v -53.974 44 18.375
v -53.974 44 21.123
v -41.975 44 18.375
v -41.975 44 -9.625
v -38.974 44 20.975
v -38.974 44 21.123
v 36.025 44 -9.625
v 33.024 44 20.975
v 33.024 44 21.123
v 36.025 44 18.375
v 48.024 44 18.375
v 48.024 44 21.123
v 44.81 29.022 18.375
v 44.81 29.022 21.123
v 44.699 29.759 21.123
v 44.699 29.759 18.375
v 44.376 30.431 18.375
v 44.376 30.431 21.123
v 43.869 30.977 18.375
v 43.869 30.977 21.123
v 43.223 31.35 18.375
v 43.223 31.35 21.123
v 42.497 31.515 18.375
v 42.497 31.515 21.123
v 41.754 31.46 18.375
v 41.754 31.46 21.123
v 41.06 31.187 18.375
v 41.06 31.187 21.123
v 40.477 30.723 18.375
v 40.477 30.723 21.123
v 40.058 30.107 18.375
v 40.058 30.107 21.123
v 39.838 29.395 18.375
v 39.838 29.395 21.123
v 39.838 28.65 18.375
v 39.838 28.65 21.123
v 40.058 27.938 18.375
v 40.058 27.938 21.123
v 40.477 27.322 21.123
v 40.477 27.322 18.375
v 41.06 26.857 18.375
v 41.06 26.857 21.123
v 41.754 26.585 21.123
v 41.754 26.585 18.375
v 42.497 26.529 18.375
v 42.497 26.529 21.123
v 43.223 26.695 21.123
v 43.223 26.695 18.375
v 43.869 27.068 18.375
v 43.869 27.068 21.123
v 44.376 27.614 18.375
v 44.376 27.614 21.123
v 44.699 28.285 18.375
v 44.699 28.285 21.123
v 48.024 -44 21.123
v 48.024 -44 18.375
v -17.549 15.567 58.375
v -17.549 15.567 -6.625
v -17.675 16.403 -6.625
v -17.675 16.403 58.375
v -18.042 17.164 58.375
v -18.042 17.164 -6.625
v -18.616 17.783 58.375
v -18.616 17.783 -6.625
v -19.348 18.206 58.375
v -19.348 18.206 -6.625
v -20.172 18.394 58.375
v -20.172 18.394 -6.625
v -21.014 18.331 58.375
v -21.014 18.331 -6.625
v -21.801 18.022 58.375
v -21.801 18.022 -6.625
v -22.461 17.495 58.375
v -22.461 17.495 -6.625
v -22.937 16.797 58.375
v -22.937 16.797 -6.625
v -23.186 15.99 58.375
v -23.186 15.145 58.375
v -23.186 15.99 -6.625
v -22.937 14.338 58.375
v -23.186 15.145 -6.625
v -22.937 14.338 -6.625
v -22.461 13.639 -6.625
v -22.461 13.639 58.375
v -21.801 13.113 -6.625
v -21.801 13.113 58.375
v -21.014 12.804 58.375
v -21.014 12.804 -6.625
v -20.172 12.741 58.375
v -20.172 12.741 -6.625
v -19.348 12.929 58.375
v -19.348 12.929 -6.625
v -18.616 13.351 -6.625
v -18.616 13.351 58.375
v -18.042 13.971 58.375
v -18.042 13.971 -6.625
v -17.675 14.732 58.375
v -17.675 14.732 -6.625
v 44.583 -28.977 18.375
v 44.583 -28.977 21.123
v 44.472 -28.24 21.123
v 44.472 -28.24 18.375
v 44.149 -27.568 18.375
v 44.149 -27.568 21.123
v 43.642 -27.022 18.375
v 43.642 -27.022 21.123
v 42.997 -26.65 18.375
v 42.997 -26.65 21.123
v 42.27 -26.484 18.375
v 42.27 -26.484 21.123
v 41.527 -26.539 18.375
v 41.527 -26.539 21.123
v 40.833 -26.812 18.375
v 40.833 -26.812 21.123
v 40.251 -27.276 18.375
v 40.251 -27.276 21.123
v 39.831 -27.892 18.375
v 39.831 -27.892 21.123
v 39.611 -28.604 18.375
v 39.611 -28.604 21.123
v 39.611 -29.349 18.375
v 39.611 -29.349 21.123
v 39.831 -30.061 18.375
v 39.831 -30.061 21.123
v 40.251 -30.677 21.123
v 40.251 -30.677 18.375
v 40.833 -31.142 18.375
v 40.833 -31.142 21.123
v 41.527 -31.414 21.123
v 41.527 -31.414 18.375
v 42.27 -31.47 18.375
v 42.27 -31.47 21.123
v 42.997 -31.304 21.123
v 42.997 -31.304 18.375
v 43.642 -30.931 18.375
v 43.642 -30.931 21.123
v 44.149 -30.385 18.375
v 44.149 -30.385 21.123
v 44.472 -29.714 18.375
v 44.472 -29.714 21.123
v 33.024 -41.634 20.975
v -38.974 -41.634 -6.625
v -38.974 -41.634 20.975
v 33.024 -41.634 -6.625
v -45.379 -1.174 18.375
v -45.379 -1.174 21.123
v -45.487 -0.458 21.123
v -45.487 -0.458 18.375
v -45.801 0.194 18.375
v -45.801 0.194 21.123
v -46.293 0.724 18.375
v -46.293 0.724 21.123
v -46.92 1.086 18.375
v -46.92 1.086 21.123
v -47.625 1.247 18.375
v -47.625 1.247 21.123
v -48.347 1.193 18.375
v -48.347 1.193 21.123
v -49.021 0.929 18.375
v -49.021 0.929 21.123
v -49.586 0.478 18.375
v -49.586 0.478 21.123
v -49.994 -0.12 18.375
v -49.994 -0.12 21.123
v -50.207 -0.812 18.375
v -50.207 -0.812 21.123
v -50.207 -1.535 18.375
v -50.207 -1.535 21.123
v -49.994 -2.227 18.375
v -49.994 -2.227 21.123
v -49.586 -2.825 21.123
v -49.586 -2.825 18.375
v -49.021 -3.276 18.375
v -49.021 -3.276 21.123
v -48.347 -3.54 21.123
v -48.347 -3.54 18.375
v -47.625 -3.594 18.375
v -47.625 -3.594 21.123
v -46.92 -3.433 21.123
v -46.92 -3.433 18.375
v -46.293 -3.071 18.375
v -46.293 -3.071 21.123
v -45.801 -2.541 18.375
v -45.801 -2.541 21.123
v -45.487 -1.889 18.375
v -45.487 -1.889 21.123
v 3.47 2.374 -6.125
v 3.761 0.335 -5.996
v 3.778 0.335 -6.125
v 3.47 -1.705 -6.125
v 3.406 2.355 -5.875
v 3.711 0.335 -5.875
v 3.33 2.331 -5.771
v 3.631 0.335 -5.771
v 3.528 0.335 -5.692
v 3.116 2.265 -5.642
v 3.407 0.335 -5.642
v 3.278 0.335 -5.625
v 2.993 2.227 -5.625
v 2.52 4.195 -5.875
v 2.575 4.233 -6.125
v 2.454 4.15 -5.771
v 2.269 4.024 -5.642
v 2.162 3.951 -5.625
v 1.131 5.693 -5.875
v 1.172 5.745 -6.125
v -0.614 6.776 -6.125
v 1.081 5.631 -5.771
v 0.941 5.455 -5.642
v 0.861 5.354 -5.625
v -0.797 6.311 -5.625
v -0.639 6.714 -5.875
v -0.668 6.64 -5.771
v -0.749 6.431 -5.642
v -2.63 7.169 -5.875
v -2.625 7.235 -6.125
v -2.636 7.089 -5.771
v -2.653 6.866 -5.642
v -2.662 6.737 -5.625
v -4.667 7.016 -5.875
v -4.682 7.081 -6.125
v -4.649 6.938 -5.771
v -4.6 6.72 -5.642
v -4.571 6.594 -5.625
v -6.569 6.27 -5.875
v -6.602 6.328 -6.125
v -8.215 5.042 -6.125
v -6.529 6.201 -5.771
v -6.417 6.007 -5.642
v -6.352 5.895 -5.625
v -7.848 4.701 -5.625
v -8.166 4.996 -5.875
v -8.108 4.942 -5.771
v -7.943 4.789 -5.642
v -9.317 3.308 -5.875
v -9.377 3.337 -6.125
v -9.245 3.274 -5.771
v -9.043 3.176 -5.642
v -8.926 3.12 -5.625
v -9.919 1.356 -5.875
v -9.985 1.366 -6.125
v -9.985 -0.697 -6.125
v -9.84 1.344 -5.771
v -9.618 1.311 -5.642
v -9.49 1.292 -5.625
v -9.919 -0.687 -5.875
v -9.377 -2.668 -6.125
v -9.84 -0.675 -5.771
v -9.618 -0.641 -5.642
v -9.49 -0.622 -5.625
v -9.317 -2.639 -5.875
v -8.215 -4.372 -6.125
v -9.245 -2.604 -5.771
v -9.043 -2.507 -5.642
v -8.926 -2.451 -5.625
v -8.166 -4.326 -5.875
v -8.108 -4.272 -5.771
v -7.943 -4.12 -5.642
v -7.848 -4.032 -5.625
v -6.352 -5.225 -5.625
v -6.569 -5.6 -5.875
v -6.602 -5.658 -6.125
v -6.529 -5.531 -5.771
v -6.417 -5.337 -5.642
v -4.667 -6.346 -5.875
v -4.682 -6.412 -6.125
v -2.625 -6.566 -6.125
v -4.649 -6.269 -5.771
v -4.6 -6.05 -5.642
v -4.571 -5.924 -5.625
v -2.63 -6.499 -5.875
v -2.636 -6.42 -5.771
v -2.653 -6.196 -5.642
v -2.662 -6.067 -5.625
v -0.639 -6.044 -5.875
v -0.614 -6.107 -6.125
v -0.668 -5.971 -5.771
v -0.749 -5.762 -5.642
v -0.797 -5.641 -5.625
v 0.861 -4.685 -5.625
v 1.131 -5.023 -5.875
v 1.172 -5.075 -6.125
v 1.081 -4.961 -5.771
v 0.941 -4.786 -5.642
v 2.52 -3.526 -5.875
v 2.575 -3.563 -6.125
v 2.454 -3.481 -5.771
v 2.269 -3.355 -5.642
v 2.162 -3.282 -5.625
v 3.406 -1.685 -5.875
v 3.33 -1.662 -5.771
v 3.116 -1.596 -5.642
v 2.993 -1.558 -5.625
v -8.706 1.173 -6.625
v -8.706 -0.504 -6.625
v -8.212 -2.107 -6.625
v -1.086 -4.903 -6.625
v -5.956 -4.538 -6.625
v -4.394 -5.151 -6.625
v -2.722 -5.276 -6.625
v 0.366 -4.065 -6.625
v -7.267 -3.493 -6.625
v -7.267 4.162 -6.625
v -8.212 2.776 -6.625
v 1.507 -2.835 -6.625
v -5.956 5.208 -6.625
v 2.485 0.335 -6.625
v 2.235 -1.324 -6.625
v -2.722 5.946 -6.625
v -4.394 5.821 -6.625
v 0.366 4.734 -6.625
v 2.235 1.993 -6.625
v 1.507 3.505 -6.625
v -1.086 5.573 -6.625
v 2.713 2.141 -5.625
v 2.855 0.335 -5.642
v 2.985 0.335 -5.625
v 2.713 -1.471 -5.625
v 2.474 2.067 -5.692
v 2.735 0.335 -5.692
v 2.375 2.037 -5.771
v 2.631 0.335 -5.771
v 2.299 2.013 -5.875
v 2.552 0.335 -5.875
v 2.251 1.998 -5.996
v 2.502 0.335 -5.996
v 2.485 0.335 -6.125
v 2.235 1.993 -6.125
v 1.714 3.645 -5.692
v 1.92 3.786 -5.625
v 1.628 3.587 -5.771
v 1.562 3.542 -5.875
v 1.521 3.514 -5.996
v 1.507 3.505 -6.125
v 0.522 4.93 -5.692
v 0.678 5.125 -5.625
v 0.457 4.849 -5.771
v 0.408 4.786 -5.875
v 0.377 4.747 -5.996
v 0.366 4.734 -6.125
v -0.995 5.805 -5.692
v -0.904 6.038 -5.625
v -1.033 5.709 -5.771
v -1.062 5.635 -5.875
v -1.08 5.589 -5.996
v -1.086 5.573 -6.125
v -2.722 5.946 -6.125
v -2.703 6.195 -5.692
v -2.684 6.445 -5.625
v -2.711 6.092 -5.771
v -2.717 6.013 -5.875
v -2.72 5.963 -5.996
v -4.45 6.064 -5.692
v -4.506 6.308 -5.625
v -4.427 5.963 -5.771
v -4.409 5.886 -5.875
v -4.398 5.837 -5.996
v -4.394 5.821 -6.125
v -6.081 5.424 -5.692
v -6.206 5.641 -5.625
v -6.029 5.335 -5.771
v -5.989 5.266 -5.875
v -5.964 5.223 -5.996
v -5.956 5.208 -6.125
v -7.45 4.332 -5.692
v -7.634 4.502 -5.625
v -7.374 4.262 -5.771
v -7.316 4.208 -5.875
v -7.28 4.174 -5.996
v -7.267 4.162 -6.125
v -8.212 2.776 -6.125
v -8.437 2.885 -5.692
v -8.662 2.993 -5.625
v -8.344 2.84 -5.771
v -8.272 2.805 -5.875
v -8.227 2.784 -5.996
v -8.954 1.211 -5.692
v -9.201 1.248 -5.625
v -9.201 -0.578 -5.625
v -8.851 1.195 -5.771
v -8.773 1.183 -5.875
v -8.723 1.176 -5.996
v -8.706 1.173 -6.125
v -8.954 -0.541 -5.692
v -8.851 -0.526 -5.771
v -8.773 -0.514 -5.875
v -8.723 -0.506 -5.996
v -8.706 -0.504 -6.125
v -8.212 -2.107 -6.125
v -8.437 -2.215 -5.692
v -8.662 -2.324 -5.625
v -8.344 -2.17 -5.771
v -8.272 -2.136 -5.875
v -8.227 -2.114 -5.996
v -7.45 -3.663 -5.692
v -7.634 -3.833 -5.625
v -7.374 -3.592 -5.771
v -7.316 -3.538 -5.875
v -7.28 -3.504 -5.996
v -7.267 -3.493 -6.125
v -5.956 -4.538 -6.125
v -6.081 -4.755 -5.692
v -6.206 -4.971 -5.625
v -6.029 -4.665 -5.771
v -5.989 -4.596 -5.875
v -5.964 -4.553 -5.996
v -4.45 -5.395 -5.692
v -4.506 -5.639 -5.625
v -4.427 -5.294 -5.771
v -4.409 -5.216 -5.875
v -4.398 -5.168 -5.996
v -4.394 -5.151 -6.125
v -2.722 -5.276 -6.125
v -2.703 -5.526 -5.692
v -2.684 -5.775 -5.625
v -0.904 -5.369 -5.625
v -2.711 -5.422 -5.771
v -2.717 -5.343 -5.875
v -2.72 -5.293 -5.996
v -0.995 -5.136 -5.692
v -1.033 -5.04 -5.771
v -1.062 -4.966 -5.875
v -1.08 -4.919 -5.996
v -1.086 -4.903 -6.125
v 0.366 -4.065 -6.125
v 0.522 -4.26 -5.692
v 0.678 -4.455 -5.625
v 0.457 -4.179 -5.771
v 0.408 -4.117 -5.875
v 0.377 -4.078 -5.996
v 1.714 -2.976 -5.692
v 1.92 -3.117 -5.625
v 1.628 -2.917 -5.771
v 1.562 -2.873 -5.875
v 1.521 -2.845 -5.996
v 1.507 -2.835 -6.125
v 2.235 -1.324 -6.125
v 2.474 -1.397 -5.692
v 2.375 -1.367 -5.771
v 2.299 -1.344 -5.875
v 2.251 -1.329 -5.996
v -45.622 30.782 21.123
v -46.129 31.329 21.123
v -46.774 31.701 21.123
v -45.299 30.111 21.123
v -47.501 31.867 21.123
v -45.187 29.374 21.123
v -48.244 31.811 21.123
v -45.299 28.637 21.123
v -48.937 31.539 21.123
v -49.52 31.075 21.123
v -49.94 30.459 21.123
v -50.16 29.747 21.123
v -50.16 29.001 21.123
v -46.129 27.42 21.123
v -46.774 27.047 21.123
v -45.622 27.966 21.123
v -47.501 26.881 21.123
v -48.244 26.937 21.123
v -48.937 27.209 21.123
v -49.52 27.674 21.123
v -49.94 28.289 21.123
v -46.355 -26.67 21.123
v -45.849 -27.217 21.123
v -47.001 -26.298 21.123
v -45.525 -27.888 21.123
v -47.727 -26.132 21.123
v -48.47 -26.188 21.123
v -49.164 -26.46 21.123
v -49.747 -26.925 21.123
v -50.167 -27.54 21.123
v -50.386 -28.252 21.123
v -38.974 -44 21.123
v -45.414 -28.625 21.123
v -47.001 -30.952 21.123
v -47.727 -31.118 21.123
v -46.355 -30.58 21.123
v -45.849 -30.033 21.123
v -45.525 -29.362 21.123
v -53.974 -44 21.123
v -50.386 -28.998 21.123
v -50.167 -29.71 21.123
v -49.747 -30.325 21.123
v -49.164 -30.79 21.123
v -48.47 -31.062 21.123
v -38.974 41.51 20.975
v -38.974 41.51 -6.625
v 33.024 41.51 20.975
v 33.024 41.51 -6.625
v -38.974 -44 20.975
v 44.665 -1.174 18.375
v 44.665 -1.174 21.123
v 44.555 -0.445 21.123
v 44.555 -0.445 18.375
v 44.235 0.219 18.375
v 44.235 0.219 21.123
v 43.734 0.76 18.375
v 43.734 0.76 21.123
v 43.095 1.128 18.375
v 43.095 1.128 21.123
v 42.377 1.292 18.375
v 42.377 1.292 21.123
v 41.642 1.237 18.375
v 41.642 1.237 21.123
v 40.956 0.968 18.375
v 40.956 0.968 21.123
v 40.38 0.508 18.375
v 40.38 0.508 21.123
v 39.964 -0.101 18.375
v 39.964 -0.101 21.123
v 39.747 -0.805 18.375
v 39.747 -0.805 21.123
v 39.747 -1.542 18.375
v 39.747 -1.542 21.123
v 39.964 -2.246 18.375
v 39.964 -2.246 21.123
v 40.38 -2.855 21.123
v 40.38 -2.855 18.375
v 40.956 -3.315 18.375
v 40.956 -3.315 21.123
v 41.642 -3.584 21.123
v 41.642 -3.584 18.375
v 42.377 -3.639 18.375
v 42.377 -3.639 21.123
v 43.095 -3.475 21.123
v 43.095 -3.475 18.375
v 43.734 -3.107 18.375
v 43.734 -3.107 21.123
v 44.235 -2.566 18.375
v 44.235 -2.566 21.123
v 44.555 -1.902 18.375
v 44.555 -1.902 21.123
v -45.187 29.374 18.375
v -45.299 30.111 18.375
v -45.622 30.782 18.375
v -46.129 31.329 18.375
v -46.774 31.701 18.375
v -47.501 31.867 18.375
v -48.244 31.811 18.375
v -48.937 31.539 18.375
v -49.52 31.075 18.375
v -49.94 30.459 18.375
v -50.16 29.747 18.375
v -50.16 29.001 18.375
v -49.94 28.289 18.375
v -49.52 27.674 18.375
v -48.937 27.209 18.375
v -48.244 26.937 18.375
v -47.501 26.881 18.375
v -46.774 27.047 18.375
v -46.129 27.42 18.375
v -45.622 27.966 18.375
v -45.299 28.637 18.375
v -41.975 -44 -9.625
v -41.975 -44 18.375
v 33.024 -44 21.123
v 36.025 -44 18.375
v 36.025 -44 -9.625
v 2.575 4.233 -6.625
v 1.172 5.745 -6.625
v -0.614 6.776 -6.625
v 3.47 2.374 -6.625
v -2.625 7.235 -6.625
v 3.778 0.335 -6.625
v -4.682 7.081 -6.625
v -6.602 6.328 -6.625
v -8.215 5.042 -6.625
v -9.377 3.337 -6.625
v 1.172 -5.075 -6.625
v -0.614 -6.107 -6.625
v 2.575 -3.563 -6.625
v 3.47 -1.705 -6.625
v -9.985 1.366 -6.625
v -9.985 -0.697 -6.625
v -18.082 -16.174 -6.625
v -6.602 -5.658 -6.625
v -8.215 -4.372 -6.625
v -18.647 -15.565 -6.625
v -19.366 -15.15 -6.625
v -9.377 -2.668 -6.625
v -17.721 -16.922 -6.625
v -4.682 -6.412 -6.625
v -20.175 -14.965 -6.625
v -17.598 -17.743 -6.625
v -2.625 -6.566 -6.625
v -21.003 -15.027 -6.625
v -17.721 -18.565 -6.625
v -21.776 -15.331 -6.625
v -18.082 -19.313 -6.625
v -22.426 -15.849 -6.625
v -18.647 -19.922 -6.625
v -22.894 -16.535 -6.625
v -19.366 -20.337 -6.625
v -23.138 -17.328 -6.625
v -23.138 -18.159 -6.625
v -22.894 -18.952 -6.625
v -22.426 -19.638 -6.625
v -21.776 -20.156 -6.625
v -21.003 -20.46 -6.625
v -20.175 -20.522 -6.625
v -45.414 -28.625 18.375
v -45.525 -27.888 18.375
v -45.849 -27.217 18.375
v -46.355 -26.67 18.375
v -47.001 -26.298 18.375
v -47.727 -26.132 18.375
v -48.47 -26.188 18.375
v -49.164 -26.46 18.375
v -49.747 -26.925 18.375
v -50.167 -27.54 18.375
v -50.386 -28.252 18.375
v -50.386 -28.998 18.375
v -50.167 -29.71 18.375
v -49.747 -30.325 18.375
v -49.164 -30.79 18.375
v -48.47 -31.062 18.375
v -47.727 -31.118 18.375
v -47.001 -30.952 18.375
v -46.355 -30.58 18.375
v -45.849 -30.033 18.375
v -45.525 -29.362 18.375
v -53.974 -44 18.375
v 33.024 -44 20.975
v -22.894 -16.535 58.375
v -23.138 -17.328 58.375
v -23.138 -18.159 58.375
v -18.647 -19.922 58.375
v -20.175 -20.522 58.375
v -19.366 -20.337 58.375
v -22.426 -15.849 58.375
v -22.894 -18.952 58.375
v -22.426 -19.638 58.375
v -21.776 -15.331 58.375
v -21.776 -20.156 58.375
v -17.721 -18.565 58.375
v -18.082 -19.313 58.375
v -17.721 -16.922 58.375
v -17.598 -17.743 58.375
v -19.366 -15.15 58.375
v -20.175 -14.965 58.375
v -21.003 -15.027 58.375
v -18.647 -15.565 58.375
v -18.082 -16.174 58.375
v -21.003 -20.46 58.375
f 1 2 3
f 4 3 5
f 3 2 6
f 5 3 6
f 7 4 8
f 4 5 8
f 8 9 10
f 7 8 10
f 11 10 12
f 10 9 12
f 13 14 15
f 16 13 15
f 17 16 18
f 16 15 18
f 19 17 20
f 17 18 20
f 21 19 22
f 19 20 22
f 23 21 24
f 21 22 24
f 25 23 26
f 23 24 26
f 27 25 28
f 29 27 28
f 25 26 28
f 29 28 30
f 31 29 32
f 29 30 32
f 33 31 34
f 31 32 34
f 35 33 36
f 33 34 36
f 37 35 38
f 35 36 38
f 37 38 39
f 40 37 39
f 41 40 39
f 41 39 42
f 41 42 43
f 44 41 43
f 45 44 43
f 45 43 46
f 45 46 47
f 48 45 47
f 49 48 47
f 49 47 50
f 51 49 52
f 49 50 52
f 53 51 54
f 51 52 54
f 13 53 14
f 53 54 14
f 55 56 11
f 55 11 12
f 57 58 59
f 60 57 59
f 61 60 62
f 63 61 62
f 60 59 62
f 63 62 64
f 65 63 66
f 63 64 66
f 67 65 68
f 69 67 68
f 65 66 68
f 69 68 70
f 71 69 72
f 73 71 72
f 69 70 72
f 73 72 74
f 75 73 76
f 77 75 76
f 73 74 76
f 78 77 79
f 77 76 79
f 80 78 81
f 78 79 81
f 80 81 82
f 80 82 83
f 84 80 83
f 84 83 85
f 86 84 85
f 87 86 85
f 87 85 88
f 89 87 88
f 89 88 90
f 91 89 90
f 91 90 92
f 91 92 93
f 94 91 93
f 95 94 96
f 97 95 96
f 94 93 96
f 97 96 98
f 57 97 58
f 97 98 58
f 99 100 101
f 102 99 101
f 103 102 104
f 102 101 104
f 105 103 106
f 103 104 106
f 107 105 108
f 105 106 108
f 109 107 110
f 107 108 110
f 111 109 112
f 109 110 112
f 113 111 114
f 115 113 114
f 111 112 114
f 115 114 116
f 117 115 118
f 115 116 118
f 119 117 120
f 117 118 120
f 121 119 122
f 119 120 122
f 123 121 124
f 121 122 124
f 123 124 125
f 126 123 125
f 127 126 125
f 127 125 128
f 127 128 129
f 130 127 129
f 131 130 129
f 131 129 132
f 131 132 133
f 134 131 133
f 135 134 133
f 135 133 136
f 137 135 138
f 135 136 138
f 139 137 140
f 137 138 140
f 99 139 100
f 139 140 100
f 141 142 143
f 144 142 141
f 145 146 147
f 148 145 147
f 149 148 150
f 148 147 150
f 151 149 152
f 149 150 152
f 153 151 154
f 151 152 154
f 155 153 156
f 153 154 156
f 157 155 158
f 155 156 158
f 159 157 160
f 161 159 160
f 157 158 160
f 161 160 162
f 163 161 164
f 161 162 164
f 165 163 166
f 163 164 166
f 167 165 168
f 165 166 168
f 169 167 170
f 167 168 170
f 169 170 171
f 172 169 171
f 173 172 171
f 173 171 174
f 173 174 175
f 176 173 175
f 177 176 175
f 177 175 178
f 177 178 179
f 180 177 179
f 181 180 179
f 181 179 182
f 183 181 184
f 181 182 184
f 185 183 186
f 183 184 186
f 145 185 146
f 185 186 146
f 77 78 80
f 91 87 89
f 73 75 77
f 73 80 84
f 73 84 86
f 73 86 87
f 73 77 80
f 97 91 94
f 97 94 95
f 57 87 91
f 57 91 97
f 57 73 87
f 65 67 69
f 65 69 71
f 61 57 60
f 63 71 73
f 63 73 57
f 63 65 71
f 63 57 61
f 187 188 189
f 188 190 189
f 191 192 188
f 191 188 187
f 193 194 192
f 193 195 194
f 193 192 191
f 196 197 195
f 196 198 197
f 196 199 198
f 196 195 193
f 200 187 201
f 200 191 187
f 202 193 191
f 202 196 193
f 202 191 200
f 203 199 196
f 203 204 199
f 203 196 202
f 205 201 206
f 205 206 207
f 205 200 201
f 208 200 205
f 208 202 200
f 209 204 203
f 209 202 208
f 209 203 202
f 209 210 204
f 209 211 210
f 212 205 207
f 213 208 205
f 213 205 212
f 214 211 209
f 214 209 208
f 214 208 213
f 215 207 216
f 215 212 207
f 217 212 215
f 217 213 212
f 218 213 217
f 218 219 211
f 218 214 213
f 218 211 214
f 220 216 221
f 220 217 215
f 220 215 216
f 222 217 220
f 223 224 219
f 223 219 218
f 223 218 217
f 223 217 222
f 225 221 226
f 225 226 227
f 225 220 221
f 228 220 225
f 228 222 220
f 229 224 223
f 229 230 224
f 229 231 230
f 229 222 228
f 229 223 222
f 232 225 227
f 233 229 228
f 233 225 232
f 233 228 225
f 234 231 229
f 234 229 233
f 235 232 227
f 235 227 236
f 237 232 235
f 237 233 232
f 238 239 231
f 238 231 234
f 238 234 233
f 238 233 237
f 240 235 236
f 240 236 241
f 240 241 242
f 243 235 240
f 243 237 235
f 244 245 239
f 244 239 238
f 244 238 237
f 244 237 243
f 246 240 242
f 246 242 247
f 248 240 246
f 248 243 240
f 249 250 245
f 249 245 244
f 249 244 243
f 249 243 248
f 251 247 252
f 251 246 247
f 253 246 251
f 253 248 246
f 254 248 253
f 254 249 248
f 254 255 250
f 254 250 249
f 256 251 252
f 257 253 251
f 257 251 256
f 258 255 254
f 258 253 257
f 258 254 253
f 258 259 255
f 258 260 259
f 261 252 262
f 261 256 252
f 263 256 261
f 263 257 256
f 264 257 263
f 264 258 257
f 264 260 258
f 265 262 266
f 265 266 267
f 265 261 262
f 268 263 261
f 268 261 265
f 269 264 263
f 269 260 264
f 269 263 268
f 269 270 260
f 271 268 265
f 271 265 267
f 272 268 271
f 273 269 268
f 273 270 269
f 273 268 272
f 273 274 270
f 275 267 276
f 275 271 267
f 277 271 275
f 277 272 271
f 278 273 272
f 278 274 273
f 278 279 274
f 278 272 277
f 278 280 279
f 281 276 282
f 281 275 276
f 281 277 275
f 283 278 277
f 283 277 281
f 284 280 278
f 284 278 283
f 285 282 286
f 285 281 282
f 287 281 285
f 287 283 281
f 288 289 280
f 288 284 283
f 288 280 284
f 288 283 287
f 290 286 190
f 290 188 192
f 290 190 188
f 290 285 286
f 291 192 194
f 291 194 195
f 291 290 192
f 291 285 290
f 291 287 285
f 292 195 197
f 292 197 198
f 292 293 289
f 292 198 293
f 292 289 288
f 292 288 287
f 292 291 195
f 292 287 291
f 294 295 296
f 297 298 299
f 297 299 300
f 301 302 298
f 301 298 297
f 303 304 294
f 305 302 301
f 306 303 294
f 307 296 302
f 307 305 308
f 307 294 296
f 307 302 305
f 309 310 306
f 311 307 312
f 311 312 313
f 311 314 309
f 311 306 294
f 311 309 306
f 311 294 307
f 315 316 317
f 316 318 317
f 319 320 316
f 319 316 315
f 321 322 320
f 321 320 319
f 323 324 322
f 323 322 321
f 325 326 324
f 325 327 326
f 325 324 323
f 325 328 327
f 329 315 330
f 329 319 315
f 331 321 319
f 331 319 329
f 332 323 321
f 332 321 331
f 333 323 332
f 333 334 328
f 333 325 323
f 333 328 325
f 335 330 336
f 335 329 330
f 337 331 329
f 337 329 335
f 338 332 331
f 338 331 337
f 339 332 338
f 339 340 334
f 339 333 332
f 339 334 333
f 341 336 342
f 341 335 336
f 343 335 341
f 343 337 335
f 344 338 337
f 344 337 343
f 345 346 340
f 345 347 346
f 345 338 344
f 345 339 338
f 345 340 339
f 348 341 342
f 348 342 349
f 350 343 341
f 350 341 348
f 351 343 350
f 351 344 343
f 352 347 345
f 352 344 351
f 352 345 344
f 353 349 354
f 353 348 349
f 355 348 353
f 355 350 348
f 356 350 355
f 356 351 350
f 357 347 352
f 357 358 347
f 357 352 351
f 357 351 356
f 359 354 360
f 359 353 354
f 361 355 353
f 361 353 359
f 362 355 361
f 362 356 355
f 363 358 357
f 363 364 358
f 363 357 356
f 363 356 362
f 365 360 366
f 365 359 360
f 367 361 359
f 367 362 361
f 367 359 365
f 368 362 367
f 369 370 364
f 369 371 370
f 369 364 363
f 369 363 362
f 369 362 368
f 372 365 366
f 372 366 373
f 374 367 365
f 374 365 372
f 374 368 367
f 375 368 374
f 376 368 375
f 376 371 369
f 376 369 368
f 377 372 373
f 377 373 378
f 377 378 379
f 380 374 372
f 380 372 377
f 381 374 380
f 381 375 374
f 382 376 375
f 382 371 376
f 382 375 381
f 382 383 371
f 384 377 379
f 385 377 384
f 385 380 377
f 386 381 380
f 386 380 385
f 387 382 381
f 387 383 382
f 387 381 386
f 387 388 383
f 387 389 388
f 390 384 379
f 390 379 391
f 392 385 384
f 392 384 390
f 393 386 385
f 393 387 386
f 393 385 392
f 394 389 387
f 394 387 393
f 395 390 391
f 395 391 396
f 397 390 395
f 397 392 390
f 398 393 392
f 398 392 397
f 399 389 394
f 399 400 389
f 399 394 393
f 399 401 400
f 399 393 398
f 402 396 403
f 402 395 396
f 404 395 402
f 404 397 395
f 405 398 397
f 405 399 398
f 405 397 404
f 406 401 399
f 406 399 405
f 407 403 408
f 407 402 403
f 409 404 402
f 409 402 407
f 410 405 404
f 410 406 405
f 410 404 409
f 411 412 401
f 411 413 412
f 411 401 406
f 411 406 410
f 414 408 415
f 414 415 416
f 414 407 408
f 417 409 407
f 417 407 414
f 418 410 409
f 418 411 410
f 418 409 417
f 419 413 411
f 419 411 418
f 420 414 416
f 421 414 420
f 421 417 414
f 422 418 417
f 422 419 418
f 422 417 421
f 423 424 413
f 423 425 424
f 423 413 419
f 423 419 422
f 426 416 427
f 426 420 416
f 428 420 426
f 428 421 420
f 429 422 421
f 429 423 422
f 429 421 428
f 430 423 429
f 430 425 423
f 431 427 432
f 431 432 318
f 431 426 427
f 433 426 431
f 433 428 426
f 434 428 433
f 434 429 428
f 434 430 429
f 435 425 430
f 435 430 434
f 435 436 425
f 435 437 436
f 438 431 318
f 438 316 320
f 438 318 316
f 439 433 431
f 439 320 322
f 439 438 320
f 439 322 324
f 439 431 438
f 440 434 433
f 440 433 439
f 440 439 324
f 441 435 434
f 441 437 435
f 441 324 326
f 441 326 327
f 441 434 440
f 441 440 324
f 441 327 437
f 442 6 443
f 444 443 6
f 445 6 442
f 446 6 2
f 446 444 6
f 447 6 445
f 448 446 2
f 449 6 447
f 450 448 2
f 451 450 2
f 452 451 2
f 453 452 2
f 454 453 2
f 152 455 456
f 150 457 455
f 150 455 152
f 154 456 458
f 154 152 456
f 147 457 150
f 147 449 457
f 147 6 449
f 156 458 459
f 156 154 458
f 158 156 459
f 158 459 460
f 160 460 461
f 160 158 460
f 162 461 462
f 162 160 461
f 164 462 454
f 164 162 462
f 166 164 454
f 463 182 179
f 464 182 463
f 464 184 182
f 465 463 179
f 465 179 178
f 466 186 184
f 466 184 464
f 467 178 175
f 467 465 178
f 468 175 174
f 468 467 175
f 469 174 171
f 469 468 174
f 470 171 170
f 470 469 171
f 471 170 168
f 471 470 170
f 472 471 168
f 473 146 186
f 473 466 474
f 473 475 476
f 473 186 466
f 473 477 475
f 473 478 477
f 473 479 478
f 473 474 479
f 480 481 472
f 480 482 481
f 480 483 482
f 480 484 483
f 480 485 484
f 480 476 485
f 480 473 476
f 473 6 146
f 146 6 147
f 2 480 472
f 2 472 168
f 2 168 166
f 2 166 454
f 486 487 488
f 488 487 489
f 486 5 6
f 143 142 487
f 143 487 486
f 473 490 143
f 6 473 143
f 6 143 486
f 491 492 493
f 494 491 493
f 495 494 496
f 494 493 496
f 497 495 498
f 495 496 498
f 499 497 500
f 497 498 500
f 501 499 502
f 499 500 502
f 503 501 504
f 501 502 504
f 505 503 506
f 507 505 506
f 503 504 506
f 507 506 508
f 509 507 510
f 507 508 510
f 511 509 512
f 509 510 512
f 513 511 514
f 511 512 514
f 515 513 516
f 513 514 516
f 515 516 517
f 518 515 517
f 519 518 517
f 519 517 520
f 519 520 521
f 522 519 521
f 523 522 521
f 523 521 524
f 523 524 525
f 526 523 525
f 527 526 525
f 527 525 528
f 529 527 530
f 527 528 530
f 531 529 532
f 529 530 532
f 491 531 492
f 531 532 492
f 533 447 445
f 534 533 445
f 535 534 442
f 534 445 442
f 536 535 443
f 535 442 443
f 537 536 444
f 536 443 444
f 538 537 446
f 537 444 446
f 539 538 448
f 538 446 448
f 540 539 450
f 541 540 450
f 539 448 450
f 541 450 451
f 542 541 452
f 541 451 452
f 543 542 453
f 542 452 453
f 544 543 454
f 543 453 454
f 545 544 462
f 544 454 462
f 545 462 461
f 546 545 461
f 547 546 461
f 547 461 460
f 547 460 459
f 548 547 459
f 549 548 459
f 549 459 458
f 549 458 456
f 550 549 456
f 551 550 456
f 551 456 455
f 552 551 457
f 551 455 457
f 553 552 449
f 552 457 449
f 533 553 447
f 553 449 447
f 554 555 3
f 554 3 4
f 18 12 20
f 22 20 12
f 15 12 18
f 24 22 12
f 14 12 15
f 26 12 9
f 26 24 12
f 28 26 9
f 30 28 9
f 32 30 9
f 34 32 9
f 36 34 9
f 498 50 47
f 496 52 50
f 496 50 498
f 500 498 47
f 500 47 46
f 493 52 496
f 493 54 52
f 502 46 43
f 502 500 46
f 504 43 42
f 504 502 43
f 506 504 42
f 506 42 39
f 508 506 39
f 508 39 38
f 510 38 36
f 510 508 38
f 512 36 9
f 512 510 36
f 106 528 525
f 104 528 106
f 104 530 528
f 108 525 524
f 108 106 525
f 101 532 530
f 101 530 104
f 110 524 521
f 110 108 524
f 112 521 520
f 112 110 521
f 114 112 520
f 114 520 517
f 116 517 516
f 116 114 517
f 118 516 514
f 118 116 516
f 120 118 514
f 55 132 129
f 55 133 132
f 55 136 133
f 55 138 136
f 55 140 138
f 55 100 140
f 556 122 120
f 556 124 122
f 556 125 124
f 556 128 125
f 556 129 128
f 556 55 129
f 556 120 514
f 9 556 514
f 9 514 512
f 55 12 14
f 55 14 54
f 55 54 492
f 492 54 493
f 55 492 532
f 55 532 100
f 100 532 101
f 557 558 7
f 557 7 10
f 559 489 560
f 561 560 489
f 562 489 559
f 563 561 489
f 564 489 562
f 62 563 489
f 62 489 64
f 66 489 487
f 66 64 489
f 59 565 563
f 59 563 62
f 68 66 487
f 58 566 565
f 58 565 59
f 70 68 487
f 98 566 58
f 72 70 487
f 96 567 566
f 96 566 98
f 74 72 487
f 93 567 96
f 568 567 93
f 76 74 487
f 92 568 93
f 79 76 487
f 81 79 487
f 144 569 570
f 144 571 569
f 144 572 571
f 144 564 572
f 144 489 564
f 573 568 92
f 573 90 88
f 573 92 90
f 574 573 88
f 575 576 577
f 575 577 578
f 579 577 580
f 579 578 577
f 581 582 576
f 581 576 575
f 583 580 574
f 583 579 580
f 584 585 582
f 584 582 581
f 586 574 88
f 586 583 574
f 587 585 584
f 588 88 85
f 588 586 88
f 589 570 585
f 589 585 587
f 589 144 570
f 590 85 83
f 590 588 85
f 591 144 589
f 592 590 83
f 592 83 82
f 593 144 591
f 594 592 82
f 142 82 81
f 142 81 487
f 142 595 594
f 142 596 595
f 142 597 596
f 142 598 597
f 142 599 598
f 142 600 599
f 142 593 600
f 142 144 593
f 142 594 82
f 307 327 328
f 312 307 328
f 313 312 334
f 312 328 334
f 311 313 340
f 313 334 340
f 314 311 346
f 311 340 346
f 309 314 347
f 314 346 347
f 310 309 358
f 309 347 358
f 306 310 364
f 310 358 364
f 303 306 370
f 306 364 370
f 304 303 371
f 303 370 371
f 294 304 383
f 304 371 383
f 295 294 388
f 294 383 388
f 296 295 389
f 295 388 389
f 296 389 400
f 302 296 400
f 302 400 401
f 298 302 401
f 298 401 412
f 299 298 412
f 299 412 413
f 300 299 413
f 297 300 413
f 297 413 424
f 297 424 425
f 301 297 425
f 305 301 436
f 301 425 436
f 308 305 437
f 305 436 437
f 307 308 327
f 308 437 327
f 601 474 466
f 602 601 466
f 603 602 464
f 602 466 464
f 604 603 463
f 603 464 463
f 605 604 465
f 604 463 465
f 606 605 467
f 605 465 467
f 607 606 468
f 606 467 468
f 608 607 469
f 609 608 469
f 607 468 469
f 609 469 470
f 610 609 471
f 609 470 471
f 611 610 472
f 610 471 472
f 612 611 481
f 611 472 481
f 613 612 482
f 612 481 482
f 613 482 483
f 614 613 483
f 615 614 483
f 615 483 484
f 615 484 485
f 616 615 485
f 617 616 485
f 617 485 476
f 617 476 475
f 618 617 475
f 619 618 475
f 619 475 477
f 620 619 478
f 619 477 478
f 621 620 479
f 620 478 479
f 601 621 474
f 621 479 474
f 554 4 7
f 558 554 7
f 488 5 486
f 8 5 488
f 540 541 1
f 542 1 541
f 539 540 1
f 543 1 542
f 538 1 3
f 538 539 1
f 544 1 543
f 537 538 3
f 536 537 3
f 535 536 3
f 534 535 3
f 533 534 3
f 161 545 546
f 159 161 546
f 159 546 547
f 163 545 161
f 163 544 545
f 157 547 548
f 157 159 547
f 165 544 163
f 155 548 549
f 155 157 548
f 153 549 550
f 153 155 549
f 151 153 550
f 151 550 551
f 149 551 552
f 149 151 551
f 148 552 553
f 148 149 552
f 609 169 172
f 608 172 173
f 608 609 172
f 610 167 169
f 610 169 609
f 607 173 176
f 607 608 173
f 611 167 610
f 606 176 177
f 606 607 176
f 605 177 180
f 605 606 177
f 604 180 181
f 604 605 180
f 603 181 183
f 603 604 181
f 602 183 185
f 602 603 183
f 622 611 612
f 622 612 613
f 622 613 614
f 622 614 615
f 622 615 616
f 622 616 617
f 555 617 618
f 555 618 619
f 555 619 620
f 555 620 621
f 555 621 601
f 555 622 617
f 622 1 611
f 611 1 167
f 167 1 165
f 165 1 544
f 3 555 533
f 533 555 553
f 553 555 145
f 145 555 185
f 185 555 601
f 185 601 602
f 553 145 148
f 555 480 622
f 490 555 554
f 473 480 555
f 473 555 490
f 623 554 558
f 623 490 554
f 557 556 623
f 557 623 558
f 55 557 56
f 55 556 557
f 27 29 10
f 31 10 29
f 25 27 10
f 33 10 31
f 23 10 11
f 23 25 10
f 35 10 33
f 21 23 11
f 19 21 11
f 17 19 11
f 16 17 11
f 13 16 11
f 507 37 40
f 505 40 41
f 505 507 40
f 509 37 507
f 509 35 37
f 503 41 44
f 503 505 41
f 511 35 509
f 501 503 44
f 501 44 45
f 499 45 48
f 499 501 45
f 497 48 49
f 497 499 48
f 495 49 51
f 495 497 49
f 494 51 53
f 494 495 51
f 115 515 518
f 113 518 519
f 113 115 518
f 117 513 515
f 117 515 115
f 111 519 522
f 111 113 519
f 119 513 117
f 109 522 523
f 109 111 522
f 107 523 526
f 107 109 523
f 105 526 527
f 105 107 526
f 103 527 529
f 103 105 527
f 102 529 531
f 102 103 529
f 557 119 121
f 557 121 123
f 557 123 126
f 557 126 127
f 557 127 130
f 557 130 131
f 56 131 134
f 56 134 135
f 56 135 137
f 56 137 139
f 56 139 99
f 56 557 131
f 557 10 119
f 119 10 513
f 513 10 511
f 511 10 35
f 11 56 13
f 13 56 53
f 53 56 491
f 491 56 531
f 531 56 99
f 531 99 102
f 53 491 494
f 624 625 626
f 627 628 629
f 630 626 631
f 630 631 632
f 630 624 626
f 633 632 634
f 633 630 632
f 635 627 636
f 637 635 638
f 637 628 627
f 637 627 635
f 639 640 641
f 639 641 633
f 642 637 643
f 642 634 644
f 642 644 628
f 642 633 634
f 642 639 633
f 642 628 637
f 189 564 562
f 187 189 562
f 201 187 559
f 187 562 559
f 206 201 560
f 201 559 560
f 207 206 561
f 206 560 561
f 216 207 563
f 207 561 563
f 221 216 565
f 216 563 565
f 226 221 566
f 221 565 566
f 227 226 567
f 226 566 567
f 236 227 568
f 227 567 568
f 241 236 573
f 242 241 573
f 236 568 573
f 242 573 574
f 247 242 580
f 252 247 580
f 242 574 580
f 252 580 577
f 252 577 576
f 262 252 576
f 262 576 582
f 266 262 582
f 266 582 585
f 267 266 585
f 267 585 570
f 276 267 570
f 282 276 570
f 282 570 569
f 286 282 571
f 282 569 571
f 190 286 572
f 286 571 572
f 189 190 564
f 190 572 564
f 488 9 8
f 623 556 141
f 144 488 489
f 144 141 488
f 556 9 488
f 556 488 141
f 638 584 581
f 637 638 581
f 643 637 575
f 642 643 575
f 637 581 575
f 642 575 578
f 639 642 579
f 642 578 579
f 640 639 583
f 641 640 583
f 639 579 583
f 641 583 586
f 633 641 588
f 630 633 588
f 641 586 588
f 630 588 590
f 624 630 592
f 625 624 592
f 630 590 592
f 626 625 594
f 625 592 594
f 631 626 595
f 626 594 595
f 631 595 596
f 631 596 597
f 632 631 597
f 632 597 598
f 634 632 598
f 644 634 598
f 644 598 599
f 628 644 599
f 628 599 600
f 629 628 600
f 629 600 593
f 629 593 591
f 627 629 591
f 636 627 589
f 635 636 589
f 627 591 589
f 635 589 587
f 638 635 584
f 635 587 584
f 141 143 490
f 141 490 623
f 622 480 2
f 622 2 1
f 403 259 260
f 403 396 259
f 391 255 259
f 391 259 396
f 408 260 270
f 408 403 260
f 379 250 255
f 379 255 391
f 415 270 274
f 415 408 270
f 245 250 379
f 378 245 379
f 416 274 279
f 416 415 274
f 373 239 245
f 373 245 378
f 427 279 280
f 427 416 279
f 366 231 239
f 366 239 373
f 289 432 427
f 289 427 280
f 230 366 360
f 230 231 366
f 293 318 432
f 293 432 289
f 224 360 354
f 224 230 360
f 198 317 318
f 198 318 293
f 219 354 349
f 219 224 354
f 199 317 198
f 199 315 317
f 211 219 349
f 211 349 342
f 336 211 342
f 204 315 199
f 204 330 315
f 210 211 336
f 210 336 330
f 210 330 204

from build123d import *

# Parameters (mm, degrees)
F1_DEPTH  = 44
F2_R      = 2.5
F2_R_2    = 2.4725548282
F2_R_3    = 2.4274448112
F3_DEPTH  = 2.748386896
F4_W      = 71.9977971367
F4_H      = 2.4901034832
F4_H_2    = 2.3662897348
F5_DEPTH  = 27.6
F6_R      = 6.9199657135
F7_DEPTH  = 1
F8_R      = 5.6269381347
F9_DEPTH  = 1
F10_R     = 0.5
F11_R     = 2.8344980175
F11_R_2   = 2.7859463521
F12_DEPTH = 65


with BuildPart() as f1:
    # F0 (on Front) → F1 (new body, symmetric)
    with BuildSketch(Plane.XZ):
        Polygon((33.0240737289, -6.6249261405), (-2.9748248395, -6.6249261405), (-2.9748248395, -9.6249261405), (36.0251751605, -9.6249261405), (36.0251751605, 18.3750738595), (48.0240737289, 18.3750738595), (48.0240737289, 21.1234607555), (33.0240737289, 21.1234607555), align=None)
        Polygon((-2.9748248395, -9.6249261405), (-2.9748248395, -6.6249261405), (-38.9737234078, -6.6249261405), (-38.9737234078, 21.1234607555), (-53.9737234078, 21.1234607555), (-53.9737234078, 18.3750738595), (-41.9748248395, 18.3750738595), (-41.9748248395, -9.6249261405), align=None)
    extrude(amount=F1_DEPTH, both=True)

    # F2 (on face) → F3 (cut, through all)
    with BuildSketch(Plane.XY.offset(21.1234607555)):
        with Locations((42.0833444824, -28.976779955)):
            Circle(F2_R)
        with Locations((42.3100408995, 29.0223339752)):
            Circle(F2_R)
        with Locations((-47.6874827498, 29.3740999725)):
            Circle(F2_R)
        with Locations((-47.9141791668, -28.6250139577)):
            Circle(F2_R)
        with Locations((42.192016639, -1.1735668668)):
            Circle(F2_R_2)
        with Locations((-47.8068819294, -1.1735668668)):
            Circle(F2_R_3)
    extrude(amount=-F3_DEPTH, mode=Mode.SUBTRACT)

    # F4 (on face) → F5 (join)
    with BuildSketch(Plane.XY.offset(-6.6249261405)):
        with Locations((-2.9748248395, 42.7549482584)):
            Rectangle(F4_W, F4_H)
        with Locations((-2.9748248395, -42.8168551326)):
            Rectangle(F4_W, F4_H_2)
    extrude(amount=F5_DEPTH)

    # F6 (on face) → F7 (join)
    with BuildSketch(Plane.XY.offset(-6.6249261405)):
        with Locations((-3.1422167085, 0.3347826132)):
            Circle(F6_R)
    extrude(amount=F7_DEPTH)

    # F8 (on face) → F9 (cut)
    with BuildSketch(Plane.XY.offset(-5.6249261405)):
        with Locations((-3.1422167085, 0.3347826132)):
            Circle(F8_R)
    extrude(amount=-F9_DEPTH, mode=Mode.SUBTRACT)

    # F10
    f10_edges = [f1.edges().sort_by_distance(p)[0] for p in [
        (-10.062182, 0.334783, -5.624926),
        (-8.769155, 0.334783, -5.624926),
    ]]
    fillet(f10_edges, radius=F10_R)

    # F11 (on face) → F12 (join)
    with BuildSketch(Plane.XY.offset(-6.6249261405)):
        with Locations((-20.3835200518, 15.5673911795)):
            Circle(F11_R)
        with Locations((-20.3835200518, -17.7434775978)):
            Circle(F11_R_2)
    extrude(amount=F12_DEPTH)


solid = f1.part
